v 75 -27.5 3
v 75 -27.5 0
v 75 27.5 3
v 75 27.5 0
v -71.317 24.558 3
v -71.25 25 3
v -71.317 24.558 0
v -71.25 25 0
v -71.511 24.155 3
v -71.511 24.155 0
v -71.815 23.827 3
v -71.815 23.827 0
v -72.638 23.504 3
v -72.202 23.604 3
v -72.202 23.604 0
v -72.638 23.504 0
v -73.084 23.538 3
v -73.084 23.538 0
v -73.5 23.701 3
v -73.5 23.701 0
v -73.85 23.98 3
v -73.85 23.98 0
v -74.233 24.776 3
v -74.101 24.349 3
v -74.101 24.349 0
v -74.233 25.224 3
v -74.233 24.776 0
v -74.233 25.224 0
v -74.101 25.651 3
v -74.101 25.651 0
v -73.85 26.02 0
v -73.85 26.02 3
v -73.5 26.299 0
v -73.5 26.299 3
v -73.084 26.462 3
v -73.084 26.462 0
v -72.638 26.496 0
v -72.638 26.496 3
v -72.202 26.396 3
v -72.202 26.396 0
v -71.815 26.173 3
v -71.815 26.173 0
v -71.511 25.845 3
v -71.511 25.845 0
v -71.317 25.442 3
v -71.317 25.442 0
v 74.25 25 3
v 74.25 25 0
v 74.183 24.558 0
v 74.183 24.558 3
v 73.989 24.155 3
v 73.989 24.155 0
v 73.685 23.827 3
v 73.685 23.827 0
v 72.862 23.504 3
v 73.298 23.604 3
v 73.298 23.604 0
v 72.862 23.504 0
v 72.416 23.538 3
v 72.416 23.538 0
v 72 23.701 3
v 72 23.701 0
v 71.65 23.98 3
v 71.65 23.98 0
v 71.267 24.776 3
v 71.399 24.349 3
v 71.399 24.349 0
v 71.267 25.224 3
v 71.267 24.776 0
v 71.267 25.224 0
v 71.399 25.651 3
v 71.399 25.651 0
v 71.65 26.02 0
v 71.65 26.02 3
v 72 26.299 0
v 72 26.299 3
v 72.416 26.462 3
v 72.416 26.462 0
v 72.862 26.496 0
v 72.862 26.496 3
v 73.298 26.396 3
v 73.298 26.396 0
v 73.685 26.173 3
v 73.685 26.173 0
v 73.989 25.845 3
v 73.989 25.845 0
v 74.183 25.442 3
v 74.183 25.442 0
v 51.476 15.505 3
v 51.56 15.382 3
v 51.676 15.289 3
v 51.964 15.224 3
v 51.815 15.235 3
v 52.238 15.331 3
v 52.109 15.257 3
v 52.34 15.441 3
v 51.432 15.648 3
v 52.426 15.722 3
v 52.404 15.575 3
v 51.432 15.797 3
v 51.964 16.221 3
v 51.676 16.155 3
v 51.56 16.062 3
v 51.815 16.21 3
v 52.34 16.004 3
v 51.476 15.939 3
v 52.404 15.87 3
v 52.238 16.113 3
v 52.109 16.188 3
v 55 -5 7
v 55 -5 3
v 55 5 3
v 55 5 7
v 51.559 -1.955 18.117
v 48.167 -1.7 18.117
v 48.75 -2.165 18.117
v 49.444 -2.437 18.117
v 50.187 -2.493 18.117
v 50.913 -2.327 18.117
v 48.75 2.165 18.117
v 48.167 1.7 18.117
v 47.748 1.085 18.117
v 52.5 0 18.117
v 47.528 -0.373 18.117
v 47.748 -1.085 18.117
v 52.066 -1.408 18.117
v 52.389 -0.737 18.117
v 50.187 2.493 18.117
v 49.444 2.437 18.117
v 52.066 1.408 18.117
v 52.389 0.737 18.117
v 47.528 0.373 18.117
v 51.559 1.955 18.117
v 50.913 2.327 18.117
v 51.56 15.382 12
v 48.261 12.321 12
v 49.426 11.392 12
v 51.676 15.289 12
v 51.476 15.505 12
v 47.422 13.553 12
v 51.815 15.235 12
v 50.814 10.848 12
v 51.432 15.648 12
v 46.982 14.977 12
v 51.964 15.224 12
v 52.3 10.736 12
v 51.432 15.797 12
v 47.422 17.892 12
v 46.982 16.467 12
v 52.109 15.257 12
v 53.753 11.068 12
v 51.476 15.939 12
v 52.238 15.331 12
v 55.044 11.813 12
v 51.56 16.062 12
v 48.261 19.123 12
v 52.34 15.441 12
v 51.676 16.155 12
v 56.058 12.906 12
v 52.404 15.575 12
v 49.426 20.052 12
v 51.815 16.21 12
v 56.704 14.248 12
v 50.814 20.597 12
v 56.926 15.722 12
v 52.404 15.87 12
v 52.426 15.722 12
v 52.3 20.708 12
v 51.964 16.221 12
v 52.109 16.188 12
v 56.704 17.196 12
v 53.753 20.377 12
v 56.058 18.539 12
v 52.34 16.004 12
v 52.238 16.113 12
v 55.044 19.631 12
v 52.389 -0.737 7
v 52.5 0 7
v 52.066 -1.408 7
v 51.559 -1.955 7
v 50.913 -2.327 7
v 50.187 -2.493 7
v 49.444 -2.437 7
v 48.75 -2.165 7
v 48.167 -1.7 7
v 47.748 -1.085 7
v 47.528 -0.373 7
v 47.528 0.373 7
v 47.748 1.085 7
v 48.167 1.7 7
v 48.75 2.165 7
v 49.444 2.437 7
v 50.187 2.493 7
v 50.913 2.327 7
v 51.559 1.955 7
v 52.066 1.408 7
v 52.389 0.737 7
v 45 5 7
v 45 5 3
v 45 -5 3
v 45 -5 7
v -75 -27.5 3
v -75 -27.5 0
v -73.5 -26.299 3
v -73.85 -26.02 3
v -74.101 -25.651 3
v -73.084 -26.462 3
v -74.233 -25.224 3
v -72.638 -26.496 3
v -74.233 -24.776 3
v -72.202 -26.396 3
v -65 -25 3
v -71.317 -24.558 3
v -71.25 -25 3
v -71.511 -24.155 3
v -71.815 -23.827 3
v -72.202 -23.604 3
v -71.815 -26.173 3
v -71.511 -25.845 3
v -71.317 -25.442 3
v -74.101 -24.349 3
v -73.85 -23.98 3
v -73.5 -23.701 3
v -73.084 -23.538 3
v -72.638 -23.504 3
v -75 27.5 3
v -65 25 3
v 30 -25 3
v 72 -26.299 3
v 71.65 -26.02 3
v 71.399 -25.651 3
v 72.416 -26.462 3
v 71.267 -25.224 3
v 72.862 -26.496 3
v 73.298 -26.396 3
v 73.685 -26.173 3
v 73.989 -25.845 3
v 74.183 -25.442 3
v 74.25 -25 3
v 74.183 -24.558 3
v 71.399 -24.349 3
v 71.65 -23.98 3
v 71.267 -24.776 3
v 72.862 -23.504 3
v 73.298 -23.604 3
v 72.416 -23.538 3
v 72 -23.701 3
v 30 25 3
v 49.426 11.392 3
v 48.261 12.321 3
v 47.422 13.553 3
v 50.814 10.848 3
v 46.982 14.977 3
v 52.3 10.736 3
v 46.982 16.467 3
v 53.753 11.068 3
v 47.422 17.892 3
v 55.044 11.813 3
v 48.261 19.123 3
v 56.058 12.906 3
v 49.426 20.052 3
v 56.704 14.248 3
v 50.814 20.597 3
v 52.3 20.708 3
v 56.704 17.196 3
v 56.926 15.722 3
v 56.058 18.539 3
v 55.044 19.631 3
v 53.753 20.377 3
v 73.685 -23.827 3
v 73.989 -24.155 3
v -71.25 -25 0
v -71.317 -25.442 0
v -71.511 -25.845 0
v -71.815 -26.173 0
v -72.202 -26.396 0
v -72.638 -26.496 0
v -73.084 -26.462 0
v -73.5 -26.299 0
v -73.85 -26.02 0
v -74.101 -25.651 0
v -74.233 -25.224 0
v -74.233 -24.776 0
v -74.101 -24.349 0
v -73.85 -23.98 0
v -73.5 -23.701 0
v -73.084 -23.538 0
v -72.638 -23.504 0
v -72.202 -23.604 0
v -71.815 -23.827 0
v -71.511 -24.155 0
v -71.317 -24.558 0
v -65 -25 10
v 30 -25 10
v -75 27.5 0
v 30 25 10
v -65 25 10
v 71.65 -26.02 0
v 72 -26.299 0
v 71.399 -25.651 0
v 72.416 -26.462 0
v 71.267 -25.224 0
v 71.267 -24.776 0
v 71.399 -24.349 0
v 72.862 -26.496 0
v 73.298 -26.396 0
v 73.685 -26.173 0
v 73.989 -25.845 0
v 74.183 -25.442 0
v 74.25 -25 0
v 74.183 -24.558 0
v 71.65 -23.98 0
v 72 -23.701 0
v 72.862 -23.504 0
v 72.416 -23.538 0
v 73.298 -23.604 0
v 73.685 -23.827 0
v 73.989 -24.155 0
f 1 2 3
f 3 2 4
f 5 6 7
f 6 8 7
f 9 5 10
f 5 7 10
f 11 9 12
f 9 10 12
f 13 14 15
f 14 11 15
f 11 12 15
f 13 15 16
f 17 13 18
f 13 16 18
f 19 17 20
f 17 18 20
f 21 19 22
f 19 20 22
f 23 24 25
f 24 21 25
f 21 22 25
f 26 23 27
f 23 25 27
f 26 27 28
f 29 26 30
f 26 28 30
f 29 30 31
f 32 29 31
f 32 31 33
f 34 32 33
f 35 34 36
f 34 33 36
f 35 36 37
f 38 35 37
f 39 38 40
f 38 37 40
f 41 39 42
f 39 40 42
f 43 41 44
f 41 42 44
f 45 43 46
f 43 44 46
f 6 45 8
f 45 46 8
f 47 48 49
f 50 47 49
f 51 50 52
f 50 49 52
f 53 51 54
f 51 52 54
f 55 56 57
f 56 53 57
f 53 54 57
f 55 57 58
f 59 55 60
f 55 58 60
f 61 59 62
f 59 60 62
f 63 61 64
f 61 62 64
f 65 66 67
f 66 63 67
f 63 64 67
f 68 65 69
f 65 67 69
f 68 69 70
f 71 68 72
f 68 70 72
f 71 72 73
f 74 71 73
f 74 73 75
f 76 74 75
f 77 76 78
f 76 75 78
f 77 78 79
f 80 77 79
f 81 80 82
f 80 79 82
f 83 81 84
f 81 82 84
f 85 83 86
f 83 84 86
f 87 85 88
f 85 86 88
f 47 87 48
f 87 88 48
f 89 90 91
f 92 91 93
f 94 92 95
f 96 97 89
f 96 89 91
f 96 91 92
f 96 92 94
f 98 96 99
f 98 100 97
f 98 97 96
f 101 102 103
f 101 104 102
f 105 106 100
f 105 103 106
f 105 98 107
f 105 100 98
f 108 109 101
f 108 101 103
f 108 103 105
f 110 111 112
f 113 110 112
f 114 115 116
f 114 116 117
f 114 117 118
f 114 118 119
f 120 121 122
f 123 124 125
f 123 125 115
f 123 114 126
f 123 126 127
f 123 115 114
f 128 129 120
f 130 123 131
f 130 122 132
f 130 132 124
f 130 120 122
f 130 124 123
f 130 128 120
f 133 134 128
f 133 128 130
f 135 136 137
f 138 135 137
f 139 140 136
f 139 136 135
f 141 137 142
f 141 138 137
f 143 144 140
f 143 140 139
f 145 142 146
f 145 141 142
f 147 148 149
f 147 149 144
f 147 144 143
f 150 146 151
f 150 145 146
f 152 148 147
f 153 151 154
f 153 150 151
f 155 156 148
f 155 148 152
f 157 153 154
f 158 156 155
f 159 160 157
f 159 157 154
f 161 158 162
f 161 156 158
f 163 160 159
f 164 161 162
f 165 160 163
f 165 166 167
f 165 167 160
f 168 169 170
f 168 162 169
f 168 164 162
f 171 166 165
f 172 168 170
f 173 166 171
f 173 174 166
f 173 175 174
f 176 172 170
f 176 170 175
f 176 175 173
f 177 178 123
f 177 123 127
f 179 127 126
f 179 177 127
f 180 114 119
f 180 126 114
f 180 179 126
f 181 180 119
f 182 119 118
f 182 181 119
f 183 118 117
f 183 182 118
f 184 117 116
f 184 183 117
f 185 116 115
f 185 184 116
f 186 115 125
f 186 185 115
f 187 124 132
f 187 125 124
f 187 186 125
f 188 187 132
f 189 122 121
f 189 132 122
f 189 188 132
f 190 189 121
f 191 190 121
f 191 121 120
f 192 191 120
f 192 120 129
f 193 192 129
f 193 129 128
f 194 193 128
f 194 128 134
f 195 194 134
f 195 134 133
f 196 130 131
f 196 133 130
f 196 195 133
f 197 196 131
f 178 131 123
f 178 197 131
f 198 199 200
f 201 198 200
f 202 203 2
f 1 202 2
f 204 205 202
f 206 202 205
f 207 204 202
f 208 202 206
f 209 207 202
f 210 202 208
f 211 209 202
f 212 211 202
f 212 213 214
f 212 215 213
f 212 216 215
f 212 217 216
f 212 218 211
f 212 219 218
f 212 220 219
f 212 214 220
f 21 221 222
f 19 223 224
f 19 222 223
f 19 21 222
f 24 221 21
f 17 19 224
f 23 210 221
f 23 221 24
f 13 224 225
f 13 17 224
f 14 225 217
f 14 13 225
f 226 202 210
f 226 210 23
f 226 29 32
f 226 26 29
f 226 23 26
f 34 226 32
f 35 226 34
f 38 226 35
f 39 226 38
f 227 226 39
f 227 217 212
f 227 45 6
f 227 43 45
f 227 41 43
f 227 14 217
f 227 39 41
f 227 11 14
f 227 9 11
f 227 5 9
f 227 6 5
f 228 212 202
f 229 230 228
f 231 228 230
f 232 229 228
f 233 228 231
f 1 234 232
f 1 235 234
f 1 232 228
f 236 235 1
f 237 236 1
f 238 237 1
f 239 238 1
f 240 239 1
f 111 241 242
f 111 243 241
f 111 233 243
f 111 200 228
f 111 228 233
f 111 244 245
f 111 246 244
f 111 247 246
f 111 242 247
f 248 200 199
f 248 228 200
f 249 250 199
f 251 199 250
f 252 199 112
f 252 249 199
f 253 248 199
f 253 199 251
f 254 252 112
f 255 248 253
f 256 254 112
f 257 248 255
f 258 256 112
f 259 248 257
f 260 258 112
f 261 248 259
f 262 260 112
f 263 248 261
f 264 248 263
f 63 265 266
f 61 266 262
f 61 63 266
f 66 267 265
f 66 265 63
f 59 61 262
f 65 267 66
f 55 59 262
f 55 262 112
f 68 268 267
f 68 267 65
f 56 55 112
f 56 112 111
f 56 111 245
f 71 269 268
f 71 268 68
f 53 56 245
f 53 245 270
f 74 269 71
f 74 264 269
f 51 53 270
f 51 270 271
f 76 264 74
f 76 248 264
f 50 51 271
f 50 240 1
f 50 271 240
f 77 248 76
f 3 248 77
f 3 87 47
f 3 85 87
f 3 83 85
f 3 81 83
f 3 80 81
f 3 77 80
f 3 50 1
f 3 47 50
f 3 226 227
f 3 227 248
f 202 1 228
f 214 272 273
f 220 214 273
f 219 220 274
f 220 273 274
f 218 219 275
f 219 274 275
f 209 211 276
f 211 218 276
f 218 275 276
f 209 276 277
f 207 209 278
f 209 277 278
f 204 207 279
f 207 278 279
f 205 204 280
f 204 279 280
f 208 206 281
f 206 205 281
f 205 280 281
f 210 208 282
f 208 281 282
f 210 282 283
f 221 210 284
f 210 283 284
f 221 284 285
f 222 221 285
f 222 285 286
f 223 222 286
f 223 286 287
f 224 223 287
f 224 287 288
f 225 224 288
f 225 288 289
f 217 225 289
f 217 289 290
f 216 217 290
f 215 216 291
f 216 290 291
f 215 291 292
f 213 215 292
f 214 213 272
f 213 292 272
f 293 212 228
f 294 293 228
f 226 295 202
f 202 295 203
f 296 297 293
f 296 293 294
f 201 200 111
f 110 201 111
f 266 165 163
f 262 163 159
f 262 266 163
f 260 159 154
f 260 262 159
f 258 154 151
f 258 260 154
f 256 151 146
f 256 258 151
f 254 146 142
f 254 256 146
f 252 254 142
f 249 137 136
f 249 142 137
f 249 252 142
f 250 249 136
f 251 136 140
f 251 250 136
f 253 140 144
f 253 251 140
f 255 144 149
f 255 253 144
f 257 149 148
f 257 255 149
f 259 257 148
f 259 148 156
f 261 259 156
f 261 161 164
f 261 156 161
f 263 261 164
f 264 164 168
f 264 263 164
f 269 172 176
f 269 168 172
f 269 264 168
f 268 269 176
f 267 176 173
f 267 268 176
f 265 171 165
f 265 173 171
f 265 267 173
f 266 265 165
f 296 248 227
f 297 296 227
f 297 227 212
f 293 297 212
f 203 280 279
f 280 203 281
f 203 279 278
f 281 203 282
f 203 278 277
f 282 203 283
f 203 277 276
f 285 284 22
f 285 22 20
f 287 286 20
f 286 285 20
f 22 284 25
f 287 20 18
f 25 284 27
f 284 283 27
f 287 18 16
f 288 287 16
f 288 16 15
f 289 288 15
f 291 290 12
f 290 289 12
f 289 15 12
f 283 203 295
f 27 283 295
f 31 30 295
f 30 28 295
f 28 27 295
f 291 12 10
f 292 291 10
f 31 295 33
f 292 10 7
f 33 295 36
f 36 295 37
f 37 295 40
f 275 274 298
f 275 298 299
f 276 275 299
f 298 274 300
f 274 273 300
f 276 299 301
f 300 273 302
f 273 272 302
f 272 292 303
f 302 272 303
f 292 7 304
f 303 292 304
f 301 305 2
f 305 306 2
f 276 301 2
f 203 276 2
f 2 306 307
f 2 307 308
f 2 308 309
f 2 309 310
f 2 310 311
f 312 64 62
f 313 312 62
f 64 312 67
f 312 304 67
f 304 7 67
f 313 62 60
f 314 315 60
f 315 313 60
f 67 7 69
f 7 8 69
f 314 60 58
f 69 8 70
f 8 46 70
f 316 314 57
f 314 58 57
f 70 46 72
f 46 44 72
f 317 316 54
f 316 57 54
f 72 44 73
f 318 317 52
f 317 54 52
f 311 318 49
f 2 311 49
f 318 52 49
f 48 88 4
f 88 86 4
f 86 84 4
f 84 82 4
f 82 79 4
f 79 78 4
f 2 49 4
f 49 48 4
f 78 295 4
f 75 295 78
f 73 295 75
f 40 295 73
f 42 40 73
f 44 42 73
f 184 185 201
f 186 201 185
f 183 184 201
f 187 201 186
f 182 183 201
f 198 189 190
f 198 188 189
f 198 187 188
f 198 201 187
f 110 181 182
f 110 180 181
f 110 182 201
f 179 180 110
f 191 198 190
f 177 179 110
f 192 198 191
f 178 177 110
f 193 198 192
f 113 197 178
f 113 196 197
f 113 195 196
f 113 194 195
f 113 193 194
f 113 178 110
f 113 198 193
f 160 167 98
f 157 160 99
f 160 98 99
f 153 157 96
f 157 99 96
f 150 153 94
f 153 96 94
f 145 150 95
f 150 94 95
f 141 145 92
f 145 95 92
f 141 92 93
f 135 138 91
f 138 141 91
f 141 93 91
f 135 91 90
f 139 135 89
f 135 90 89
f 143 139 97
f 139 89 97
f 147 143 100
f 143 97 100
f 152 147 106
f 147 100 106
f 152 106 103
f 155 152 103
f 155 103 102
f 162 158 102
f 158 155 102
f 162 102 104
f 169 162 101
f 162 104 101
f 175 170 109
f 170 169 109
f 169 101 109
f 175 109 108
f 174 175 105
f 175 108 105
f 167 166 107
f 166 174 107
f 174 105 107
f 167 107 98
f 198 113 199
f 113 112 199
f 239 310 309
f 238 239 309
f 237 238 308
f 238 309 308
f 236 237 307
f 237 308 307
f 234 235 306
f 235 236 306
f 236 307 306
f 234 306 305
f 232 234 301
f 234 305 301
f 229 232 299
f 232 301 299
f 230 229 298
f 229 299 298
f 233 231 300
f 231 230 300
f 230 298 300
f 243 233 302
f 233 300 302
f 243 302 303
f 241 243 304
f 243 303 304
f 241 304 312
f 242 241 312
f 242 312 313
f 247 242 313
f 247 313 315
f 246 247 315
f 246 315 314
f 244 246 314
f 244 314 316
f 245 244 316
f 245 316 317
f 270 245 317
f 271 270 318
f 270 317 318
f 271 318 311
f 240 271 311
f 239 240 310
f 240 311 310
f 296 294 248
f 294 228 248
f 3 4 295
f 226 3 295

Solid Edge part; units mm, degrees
sketch "Sketch1" plane through (0, 0, 0) normal (0, 0, 1) x (1, 0, 0)
  circle A0 centre (-72.75, 25) radius 1.5
  circle A1 centre (72.75, 25) radius 1.5
  circle A2 centre (72.75, -25) radius 1.5
  circle A3 centre (-72.75, -25) radius 1.5
  line L0 (-75, -27.5) -> (75, -27.5)
  line L1 (75, -27.5) -> (75, 27.5)
  line L2 (75, 27.5) -> (-75, 27.5)
  line L3 (-75, 27.5) -> (-75, -27.5)
  dimension "D1" = 55
  dimension "D2" = 55
  dimension "D3" = 27.5
  dimension "D4" = 150
  dimension "D5" = 55
  dimension "D6" = 75
  dimension "D7" = 145.5
  dimension "D8" = 72.75
  dimension "D9" = 25
  dimension "D10" = 25
extrude "Protrusion1" add sketch "Sketch1" along normal blind 3
sketch "Sketch2" plane through (0, 0, 0) normal (0, 0, 1) x (1, 0, 0)
  line L0 (-65, -25) -> (30, -25)
  line L1 (30, -25) -> (30, 25)
  line L2 (30, 25) -> (-65, 25)
  line L3 (-65, 25) -> (-65, -25)
  dimension "D1" = 25
  dimension "D2" = 25
  dimension "D3" = 65
  dimension "D4" = 30
extrude "ExtrudedProtrusion_2" add sketch "Sketch2" along normal blind 10
sketch "Sketch3" plane through (0, 0, 0) normal (0, 0, 1) x (1, 0, 0)
  circle A0 centre (51.9265, 15.7222) radius 5
  circle A1 centre (51.9265, 15.7222) radius 0.5
extrude "ExtrudedProtrusion_3" add sketch "Sketch3" along normal blind 12
sketch "Sketch4" plane through (0, 0, 0) normal (0, 0, 1) x (1, 0, 0)
  line L0 (45, -5) -> (55, -5)
  line L1 (55, -5) -> (55, 5)
  line L2 (55, 5) -> (45, 5)
  line L3 (45, 5) -> (45, -5)
  dimension "D1" = 10
  dimension "D2" = 10
  dimension "D3" = 5
  dimension "D4" = 55
extrude "ExtrudedProtrusion_4" add sketch "Sketch4" along normal blind 7
sketch "Sketch5" plane through (50, 0, 7) normal (0, 0, 1) x (1, 0, 0)
  circle A0 centre (0, 0) radius 2.5
  dimension "D1" = 5
  dimension "D2" = 5
extrude "ExtrudedProtrusion_5" add sketch "Sketch5" along normal blind 11.1168
